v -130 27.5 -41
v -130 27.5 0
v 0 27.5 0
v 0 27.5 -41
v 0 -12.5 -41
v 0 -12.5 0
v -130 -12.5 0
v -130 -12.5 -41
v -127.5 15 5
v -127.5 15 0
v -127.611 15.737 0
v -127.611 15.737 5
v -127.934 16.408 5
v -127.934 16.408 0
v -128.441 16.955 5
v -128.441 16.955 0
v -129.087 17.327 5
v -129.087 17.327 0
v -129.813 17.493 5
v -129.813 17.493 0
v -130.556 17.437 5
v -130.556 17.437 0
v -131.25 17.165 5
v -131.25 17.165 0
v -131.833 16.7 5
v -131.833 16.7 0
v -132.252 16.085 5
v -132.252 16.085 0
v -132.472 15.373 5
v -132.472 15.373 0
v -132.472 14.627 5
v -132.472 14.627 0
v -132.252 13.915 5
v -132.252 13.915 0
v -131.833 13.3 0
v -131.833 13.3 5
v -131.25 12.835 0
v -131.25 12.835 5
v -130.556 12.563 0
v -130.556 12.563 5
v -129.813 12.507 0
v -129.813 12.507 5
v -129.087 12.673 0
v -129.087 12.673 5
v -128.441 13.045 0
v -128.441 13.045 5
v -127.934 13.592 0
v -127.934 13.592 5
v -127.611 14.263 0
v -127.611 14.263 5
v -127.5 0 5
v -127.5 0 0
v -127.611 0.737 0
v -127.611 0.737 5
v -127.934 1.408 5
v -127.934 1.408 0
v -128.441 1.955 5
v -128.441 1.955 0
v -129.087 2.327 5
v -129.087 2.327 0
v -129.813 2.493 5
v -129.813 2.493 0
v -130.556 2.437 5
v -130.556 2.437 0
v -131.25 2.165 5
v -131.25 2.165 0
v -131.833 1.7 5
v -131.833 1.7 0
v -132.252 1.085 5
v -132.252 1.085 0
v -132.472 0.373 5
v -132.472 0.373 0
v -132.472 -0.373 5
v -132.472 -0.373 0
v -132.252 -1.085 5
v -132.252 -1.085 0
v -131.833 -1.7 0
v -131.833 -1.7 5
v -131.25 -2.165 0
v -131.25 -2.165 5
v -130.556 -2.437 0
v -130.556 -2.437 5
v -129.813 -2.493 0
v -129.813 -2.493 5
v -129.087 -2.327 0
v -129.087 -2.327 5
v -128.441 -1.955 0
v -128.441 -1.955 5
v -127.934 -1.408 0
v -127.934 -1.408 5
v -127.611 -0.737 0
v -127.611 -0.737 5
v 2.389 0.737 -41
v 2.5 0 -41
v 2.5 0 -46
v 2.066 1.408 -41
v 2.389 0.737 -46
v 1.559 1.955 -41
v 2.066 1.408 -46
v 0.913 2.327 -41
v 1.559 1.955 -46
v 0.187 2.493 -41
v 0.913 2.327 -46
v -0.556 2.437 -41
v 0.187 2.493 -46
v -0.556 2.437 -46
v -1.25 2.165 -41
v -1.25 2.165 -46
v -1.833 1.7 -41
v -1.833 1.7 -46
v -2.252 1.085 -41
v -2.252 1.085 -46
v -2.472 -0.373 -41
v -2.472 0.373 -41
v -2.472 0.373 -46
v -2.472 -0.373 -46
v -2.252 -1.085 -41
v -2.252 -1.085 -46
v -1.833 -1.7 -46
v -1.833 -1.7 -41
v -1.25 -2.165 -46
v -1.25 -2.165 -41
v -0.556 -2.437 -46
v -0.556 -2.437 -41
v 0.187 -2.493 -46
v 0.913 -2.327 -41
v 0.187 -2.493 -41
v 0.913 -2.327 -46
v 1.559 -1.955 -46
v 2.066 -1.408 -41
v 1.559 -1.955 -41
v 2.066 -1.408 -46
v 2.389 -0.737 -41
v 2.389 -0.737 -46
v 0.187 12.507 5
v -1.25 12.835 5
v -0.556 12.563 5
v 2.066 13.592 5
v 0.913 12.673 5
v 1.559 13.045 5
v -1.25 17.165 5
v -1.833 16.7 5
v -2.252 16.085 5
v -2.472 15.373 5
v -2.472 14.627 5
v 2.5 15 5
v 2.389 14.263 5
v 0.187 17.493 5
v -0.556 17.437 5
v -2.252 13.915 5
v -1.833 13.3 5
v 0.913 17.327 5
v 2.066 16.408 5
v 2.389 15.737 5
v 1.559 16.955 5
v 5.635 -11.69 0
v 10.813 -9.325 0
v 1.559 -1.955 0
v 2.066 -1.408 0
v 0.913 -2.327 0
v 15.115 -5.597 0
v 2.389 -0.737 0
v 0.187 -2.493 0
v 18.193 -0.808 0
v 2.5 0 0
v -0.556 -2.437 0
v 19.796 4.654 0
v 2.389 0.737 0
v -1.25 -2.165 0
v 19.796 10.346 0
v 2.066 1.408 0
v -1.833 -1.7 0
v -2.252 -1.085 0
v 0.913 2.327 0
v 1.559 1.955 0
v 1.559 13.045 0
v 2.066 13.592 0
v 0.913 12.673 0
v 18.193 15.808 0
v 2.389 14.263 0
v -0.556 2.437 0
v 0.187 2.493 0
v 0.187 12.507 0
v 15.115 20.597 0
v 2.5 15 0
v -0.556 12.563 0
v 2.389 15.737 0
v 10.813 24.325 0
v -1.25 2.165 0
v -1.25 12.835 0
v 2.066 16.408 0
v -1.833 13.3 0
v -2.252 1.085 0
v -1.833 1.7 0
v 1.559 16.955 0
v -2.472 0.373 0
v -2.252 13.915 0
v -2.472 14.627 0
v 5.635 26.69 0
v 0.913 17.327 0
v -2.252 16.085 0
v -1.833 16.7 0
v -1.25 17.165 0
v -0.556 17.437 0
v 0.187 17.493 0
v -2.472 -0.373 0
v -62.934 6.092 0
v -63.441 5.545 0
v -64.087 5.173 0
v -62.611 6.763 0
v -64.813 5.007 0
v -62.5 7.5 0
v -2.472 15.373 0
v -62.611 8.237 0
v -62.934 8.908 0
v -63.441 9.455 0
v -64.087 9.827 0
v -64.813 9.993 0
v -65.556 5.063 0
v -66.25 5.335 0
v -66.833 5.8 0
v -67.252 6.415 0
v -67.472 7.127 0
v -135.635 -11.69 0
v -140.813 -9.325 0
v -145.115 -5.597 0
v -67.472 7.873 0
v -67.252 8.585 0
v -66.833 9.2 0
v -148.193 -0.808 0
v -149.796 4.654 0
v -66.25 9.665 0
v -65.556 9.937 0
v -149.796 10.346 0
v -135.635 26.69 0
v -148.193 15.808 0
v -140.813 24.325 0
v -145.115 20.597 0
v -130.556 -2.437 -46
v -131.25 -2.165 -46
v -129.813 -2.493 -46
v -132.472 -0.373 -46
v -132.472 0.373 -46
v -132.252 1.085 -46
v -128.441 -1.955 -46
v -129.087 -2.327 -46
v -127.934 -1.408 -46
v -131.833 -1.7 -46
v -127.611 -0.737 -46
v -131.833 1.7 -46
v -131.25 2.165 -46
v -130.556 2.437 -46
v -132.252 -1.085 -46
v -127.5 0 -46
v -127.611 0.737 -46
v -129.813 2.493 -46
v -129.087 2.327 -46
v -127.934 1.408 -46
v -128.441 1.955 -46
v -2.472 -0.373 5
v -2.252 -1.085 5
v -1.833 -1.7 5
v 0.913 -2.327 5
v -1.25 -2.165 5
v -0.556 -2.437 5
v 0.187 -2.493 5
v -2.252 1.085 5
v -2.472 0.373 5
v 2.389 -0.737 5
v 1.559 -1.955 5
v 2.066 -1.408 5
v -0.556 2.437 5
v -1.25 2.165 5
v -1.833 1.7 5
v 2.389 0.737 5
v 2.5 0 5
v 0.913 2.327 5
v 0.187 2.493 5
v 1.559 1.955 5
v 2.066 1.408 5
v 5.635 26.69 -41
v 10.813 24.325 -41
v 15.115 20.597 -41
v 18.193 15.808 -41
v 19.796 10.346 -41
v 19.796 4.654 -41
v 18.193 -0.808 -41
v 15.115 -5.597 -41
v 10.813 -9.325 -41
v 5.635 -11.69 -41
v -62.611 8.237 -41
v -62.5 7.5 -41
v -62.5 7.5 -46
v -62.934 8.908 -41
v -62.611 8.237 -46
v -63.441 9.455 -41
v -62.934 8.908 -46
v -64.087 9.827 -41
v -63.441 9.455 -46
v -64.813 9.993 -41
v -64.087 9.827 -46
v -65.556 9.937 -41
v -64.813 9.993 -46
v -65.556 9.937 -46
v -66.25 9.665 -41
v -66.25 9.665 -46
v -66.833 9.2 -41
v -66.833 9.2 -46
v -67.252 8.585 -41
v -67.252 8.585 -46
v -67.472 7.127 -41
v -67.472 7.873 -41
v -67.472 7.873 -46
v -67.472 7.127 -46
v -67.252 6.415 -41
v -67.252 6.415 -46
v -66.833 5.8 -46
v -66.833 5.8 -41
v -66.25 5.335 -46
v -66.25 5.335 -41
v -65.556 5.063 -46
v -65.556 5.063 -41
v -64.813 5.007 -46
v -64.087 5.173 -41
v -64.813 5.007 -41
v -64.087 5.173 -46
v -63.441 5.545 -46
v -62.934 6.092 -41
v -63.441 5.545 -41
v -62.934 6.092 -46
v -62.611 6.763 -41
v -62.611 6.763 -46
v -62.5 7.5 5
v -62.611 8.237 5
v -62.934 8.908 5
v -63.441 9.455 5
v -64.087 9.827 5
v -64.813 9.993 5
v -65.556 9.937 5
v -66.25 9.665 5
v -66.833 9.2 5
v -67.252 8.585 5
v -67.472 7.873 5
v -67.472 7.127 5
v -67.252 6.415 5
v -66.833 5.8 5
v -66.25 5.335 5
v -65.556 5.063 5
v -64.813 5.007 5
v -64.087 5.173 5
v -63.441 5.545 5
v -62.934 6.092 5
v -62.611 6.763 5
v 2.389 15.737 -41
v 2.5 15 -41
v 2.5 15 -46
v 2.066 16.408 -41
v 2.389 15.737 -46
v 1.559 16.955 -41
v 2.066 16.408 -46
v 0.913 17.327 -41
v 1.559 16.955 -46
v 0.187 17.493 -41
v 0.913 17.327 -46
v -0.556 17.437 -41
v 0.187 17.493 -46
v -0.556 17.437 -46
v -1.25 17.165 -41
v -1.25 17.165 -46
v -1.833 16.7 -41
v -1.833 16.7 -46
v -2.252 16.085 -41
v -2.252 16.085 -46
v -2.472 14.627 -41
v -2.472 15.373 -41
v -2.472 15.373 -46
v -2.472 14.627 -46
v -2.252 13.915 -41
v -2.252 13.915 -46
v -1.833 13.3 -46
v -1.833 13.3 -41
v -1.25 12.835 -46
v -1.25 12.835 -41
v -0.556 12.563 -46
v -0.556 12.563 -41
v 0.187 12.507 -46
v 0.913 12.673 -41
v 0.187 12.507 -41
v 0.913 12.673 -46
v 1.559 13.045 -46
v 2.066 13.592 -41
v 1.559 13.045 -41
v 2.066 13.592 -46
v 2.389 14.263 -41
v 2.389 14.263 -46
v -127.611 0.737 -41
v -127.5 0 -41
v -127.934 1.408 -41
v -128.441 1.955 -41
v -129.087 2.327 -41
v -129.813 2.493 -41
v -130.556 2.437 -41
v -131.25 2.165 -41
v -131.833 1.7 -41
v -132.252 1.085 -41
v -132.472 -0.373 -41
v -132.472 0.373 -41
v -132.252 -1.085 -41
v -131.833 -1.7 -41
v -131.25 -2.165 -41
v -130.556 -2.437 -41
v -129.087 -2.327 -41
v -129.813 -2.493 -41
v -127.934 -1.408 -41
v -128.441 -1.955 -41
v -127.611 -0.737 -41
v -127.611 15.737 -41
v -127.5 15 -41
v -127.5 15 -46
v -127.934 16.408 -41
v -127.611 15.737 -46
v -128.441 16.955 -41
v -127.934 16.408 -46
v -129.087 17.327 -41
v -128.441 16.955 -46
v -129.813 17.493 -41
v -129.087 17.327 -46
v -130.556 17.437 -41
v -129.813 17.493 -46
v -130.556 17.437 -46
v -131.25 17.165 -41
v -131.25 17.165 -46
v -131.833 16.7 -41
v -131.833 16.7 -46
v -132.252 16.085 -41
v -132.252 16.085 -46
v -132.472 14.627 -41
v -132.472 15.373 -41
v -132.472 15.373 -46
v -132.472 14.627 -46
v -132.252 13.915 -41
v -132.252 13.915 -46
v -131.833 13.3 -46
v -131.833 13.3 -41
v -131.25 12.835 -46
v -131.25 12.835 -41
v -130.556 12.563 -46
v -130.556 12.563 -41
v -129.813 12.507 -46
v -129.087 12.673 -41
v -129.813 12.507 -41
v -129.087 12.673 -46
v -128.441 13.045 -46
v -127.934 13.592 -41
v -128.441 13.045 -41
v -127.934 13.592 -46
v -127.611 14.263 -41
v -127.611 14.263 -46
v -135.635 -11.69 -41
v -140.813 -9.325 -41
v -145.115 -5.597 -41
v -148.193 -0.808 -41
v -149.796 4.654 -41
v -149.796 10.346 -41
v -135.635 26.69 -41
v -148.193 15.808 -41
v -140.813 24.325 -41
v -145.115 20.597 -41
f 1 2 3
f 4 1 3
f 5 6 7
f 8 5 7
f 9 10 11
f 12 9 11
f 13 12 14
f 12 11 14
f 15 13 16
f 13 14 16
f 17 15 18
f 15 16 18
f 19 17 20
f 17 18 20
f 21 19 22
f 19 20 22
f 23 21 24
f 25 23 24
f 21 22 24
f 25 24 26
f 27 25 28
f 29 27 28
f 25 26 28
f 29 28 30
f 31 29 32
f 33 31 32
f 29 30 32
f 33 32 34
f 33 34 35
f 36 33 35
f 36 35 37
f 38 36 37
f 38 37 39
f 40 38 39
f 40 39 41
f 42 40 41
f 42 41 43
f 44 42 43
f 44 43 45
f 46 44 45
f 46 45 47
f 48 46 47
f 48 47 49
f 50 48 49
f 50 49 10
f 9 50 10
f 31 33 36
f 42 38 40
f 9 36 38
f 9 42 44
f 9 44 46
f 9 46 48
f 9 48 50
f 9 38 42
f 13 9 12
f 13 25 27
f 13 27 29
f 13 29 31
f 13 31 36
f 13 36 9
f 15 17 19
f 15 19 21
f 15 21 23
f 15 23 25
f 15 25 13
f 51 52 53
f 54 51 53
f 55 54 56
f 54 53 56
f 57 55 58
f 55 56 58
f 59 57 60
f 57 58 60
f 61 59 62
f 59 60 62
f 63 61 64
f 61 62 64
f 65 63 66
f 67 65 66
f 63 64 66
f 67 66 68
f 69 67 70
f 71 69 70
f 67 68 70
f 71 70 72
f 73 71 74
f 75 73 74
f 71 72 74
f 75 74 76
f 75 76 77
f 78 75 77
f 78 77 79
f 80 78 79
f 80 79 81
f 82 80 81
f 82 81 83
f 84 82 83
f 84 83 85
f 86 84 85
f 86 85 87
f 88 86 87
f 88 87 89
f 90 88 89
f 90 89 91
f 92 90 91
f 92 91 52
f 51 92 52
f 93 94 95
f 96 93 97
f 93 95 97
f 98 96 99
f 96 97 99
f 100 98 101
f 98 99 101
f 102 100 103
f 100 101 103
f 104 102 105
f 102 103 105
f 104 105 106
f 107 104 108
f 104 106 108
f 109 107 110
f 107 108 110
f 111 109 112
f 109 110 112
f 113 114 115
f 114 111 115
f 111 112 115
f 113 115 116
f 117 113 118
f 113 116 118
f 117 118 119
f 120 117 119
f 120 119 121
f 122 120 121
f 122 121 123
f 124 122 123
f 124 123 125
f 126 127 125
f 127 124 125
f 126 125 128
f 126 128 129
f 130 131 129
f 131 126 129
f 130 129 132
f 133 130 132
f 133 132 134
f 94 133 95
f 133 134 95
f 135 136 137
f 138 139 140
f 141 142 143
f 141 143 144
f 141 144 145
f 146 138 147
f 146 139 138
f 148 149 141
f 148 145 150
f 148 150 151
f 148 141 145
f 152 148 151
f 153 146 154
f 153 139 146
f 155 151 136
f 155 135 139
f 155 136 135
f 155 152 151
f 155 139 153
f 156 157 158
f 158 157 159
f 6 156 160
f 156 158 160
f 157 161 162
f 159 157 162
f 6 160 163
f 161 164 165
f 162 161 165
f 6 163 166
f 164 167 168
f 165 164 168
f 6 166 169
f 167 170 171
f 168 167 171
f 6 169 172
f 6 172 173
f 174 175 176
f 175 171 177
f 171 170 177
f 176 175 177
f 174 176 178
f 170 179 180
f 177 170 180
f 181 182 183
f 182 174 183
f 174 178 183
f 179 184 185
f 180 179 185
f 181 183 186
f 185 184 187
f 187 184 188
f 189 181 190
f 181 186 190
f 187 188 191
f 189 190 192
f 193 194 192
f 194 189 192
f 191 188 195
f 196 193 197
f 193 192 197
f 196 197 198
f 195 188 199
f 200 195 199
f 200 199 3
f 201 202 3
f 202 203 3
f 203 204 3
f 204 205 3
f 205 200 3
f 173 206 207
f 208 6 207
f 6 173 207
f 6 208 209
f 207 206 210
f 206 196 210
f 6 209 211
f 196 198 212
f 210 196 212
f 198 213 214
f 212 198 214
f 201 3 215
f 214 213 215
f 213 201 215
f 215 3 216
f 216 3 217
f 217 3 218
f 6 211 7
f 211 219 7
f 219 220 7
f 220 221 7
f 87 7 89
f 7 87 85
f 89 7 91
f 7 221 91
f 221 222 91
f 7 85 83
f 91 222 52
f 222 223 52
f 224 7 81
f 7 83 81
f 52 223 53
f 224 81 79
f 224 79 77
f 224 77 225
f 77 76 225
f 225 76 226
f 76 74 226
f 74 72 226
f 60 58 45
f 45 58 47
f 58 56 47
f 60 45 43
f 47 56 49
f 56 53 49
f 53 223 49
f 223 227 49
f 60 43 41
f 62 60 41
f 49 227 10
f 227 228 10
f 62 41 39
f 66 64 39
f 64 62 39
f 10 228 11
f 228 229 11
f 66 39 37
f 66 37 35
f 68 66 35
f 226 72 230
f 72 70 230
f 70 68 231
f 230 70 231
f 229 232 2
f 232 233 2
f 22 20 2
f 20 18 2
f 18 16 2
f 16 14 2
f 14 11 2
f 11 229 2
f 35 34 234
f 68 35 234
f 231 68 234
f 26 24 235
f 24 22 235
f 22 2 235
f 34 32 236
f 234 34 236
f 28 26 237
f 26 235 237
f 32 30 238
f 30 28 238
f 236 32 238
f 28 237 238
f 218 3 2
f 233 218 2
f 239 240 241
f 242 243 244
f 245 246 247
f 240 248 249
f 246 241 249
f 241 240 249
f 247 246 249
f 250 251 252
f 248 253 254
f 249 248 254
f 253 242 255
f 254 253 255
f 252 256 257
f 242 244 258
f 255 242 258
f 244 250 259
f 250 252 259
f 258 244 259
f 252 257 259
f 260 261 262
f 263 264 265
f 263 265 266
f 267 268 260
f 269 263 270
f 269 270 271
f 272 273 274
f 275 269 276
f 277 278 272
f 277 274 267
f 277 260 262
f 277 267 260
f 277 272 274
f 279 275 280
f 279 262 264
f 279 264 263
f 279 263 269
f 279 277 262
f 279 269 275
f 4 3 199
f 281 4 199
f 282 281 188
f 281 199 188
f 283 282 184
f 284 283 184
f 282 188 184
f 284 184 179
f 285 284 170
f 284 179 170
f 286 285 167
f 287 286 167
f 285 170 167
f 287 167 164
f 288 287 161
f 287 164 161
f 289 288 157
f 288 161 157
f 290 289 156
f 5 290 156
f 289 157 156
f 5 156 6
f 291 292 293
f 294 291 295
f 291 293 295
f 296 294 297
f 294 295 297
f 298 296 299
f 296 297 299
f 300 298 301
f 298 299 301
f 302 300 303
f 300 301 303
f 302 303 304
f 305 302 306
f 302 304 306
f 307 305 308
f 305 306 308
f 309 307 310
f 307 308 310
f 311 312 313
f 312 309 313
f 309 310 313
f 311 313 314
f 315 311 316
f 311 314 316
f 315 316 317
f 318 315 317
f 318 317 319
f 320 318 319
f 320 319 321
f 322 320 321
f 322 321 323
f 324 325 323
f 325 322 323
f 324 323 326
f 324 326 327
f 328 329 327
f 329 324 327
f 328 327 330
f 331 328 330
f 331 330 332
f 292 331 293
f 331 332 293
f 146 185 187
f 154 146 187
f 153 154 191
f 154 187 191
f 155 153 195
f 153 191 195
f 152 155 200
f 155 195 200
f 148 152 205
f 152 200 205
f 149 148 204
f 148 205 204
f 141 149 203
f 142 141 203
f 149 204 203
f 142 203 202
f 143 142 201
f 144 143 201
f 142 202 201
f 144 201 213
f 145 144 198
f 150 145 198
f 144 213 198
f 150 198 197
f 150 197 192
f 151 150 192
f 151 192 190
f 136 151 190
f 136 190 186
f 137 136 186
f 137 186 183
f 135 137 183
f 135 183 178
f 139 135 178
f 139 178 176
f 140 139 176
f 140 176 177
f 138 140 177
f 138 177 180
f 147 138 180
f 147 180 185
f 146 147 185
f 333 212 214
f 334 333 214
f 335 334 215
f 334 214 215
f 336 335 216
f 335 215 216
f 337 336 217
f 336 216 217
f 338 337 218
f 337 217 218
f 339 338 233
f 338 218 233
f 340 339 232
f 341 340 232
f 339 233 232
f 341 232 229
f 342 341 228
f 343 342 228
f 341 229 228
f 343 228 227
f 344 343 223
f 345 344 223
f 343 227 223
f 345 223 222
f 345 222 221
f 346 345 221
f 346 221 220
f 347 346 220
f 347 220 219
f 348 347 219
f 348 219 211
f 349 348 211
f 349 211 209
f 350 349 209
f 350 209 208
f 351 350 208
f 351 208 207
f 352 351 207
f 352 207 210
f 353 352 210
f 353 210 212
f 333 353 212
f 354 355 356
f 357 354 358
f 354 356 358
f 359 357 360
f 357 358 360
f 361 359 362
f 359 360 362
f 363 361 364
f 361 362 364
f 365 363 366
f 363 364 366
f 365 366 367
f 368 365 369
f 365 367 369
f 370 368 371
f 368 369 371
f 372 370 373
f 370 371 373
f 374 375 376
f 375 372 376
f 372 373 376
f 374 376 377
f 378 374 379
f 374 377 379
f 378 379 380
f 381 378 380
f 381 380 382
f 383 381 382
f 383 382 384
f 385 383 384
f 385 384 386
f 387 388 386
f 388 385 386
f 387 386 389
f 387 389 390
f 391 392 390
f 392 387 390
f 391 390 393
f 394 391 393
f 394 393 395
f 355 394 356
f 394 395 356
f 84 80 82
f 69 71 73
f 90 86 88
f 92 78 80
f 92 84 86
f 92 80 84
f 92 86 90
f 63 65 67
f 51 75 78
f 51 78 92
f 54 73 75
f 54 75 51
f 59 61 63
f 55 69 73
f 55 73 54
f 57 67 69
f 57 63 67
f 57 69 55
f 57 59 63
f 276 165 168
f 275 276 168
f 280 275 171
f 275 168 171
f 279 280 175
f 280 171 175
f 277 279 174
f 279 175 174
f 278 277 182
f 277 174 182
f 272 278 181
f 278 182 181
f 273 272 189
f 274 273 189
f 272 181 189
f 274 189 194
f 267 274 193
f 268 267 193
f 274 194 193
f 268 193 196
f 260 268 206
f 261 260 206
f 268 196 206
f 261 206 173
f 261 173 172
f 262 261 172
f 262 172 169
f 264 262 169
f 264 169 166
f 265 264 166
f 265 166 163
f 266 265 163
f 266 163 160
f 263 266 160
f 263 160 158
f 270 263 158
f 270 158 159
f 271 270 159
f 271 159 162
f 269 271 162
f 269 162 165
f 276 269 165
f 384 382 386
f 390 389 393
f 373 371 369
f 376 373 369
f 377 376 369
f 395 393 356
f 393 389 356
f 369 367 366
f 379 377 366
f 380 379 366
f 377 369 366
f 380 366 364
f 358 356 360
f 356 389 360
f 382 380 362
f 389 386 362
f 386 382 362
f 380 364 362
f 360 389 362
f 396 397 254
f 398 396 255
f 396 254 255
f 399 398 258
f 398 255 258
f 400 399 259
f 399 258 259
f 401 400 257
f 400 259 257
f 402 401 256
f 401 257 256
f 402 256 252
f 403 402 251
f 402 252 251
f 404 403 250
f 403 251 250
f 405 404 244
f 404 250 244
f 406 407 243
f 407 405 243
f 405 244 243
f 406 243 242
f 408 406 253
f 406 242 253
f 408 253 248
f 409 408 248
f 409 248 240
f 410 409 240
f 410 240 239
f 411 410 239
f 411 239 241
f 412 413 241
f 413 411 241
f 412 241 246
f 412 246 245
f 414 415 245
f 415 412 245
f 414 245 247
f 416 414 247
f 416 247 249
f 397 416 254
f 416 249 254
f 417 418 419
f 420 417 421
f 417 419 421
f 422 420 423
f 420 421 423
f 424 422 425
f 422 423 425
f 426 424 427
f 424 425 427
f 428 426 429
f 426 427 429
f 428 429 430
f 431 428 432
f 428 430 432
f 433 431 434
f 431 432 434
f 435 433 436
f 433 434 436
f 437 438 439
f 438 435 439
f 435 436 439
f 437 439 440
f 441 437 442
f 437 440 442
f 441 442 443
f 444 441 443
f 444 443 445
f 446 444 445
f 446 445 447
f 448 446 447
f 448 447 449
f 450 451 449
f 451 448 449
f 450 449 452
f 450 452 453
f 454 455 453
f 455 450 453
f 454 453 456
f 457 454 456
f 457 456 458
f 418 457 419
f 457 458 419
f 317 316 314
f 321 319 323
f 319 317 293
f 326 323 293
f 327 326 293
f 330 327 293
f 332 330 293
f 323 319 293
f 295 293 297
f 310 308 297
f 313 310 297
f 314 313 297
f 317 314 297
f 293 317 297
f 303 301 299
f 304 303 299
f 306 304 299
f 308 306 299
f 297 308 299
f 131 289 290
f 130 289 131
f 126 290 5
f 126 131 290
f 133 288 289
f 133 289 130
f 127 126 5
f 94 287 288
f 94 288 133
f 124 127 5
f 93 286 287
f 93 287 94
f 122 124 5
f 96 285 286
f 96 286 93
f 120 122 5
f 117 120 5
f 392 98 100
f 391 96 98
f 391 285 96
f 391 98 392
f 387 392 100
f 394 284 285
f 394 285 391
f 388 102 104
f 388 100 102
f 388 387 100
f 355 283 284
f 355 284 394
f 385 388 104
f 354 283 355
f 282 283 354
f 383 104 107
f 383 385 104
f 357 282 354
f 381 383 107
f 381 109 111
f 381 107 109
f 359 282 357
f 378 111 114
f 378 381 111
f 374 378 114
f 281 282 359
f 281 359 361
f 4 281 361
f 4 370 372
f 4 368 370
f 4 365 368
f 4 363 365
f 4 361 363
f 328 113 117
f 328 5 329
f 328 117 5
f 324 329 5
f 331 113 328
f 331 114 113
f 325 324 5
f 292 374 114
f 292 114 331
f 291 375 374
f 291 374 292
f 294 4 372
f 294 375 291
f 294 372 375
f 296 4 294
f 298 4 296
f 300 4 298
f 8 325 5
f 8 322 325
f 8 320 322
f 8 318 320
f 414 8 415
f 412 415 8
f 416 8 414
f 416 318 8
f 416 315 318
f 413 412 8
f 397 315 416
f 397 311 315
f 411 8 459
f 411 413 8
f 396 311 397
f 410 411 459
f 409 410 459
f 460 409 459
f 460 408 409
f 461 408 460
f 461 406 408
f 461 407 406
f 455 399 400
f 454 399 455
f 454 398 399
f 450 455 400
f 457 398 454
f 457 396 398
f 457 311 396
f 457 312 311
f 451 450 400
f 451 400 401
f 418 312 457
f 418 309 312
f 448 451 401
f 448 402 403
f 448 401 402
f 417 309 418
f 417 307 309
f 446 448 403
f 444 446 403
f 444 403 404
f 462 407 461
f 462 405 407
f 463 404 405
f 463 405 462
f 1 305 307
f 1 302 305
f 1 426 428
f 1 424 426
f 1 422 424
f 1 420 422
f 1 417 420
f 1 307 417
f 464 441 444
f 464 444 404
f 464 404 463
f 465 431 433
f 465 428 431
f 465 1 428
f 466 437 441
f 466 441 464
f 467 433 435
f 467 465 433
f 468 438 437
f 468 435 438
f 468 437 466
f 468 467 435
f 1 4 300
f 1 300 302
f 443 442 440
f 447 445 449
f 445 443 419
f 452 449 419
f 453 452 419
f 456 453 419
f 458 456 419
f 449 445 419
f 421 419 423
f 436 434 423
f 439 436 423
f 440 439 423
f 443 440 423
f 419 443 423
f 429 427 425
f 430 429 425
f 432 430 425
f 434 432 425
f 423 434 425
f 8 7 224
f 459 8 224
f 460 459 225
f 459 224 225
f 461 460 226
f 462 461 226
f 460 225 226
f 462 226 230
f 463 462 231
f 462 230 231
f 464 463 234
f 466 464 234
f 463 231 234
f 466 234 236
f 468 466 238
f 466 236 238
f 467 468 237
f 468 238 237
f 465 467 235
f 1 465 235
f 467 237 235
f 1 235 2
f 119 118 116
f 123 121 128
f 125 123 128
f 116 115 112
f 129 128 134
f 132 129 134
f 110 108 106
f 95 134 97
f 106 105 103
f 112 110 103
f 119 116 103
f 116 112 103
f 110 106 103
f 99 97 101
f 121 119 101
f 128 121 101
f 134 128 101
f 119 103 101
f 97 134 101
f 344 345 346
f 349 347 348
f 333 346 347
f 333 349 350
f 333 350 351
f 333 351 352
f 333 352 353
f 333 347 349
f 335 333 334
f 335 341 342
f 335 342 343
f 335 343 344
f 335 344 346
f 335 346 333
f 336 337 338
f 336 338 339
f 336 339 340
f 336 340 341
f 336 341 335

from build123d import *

# Parameters (mm, degrees)
BOSS_EXTRUDE1_DEPTH        = 5
BOSS_EXTRUDE1_DEPTH_BACK   = 46
SKETCH1_R                  = 2.5
BOSS_EXTRUDE1_2_DEPTH      = 5
BOSS_EXTRUDE1_2_DEPTH_BACK = 46
BOSS_EXTRUDE1_3_DEPTH      = 5
BOSS_EXTRUDE1_3_DEPTH_BACK = 46
BOSS_EXTRUDE1_4_DEPTH      = 5
BOSS_EXTRUDE1_4_DEPTH_BACK = 46
BOSS_EXTRUDE1_5_DEPTH      = 5
BOSS_EXTRUDE1_5_DEPTH_BACK = 46
BOSS_EXTRUDE2_DEPTH        = 41


with BuildPart() as part:
    # Sketch1 → Boss-Extrude1 (new, two sides: drawn at the far end of the back side and taken through both)
    with BuildSketch(Plane.XY.offset(-BOSS_EXTRUDE1_DEPTH_BACK)):
        Circle(SKETCH1_R)
    extrude(amount=BOSS_EXTRUDE1_DEPTH + BOSS_EXTRUDE1_DEPTH_BACK)



with BuildPart() as body_2:
    # Sketch1 → Boss-Extrude1 2 (new, two sides: drawn at the far end of the back side and taken through both)
    with BuildSketch(Plane.XY.offset(-BOSS_EXTRUDE1_2_DEPTH_BACK)):
        with Locations((0, 15)):
            Circle(SKETCH1_R)
    extrude(amount=BOSS_EXTRUDE1_2_DEPTH + BOSS_EXTRUDE1_2_DEPTH_BACK)


with BuildPart() as body_3:
    # Sketch1 → Boss-Extrude1 3 (new, two sides: drawn at the far end of the back side and taken through both)
    with BuildSketch(Plane.XY.offset(-BOSS_EXTRUDE1_3_DEPTH_BACK)):
        with Locations((-130, 15)):
            Circle(SKETCH1_R)
    extrude(amount=BOSS_EXTRUDE1_3_DEPTH + BOSS_EXTRUDE1_3_DEPTH_BACK)


with BuildPart() as body_4:
    # Sketch1 → Boss-Extrude1 4 (new, two sides: drawn at the far end of the back side and taken through both)
    with BuildSketch(Plane.XY.offset(-BOSS_EXTRUDE1_4_DEPTH_BACK)):
        with Locations((-130, 0)):
            Circle(SKETCH1_R)
    extrude(amount=BOSS_EXTRUDE1_4_DEPTH + BOSS_EXTRUDE1_4_DEPTH_BACK)


with BuildPart() as body_5:
    # Sketch1 → Boss-Extrude1 5 (new, two sides: drawn at the far end of the back side and taken through both)
    with BuildSketch(Plane.XY.offset(-BOSS_EXTRUDE1_5_DEPTH_BACK)):
        with Locations((-65, 7.5)):
            Circle(SKETCH1_R)
    extrude(amount=BOSS_EXTRUDE1_5_DEPTH + BOSS_EXTRUDE1_5_DEPTH_BACK)


with BuildPart() as part_1:
    add(part.part)

    add(body_2.part)  # Boss-Extrude2 merges body 2

    add(body_3.part)  # Boss-Extrude2 merges body 3

    add(body_4.part)  # Boss-Extrude2 merges body 4

    add(body_5.part)  # Boss-Extrude2 merges body 5
    # Sketch2 → Boss-Extrude2 (add)
    with BuildSketch(Plane.XY):
        with BuildLine():
            Line((-130, 27.5), (0, 27.5))
            ThreePointArc((0, 27.5), (20, 7.5), (0, -12.5))
            Line((0, -12.5), (-130, -12.5))
            ThreePointArc((-130, -12.5), (-150, 7.5), (-130, 27.5))
        make_face()
    extrude(amount=-BOSS_EXTRUDE2_DEPTH)


solid = part_1.part
